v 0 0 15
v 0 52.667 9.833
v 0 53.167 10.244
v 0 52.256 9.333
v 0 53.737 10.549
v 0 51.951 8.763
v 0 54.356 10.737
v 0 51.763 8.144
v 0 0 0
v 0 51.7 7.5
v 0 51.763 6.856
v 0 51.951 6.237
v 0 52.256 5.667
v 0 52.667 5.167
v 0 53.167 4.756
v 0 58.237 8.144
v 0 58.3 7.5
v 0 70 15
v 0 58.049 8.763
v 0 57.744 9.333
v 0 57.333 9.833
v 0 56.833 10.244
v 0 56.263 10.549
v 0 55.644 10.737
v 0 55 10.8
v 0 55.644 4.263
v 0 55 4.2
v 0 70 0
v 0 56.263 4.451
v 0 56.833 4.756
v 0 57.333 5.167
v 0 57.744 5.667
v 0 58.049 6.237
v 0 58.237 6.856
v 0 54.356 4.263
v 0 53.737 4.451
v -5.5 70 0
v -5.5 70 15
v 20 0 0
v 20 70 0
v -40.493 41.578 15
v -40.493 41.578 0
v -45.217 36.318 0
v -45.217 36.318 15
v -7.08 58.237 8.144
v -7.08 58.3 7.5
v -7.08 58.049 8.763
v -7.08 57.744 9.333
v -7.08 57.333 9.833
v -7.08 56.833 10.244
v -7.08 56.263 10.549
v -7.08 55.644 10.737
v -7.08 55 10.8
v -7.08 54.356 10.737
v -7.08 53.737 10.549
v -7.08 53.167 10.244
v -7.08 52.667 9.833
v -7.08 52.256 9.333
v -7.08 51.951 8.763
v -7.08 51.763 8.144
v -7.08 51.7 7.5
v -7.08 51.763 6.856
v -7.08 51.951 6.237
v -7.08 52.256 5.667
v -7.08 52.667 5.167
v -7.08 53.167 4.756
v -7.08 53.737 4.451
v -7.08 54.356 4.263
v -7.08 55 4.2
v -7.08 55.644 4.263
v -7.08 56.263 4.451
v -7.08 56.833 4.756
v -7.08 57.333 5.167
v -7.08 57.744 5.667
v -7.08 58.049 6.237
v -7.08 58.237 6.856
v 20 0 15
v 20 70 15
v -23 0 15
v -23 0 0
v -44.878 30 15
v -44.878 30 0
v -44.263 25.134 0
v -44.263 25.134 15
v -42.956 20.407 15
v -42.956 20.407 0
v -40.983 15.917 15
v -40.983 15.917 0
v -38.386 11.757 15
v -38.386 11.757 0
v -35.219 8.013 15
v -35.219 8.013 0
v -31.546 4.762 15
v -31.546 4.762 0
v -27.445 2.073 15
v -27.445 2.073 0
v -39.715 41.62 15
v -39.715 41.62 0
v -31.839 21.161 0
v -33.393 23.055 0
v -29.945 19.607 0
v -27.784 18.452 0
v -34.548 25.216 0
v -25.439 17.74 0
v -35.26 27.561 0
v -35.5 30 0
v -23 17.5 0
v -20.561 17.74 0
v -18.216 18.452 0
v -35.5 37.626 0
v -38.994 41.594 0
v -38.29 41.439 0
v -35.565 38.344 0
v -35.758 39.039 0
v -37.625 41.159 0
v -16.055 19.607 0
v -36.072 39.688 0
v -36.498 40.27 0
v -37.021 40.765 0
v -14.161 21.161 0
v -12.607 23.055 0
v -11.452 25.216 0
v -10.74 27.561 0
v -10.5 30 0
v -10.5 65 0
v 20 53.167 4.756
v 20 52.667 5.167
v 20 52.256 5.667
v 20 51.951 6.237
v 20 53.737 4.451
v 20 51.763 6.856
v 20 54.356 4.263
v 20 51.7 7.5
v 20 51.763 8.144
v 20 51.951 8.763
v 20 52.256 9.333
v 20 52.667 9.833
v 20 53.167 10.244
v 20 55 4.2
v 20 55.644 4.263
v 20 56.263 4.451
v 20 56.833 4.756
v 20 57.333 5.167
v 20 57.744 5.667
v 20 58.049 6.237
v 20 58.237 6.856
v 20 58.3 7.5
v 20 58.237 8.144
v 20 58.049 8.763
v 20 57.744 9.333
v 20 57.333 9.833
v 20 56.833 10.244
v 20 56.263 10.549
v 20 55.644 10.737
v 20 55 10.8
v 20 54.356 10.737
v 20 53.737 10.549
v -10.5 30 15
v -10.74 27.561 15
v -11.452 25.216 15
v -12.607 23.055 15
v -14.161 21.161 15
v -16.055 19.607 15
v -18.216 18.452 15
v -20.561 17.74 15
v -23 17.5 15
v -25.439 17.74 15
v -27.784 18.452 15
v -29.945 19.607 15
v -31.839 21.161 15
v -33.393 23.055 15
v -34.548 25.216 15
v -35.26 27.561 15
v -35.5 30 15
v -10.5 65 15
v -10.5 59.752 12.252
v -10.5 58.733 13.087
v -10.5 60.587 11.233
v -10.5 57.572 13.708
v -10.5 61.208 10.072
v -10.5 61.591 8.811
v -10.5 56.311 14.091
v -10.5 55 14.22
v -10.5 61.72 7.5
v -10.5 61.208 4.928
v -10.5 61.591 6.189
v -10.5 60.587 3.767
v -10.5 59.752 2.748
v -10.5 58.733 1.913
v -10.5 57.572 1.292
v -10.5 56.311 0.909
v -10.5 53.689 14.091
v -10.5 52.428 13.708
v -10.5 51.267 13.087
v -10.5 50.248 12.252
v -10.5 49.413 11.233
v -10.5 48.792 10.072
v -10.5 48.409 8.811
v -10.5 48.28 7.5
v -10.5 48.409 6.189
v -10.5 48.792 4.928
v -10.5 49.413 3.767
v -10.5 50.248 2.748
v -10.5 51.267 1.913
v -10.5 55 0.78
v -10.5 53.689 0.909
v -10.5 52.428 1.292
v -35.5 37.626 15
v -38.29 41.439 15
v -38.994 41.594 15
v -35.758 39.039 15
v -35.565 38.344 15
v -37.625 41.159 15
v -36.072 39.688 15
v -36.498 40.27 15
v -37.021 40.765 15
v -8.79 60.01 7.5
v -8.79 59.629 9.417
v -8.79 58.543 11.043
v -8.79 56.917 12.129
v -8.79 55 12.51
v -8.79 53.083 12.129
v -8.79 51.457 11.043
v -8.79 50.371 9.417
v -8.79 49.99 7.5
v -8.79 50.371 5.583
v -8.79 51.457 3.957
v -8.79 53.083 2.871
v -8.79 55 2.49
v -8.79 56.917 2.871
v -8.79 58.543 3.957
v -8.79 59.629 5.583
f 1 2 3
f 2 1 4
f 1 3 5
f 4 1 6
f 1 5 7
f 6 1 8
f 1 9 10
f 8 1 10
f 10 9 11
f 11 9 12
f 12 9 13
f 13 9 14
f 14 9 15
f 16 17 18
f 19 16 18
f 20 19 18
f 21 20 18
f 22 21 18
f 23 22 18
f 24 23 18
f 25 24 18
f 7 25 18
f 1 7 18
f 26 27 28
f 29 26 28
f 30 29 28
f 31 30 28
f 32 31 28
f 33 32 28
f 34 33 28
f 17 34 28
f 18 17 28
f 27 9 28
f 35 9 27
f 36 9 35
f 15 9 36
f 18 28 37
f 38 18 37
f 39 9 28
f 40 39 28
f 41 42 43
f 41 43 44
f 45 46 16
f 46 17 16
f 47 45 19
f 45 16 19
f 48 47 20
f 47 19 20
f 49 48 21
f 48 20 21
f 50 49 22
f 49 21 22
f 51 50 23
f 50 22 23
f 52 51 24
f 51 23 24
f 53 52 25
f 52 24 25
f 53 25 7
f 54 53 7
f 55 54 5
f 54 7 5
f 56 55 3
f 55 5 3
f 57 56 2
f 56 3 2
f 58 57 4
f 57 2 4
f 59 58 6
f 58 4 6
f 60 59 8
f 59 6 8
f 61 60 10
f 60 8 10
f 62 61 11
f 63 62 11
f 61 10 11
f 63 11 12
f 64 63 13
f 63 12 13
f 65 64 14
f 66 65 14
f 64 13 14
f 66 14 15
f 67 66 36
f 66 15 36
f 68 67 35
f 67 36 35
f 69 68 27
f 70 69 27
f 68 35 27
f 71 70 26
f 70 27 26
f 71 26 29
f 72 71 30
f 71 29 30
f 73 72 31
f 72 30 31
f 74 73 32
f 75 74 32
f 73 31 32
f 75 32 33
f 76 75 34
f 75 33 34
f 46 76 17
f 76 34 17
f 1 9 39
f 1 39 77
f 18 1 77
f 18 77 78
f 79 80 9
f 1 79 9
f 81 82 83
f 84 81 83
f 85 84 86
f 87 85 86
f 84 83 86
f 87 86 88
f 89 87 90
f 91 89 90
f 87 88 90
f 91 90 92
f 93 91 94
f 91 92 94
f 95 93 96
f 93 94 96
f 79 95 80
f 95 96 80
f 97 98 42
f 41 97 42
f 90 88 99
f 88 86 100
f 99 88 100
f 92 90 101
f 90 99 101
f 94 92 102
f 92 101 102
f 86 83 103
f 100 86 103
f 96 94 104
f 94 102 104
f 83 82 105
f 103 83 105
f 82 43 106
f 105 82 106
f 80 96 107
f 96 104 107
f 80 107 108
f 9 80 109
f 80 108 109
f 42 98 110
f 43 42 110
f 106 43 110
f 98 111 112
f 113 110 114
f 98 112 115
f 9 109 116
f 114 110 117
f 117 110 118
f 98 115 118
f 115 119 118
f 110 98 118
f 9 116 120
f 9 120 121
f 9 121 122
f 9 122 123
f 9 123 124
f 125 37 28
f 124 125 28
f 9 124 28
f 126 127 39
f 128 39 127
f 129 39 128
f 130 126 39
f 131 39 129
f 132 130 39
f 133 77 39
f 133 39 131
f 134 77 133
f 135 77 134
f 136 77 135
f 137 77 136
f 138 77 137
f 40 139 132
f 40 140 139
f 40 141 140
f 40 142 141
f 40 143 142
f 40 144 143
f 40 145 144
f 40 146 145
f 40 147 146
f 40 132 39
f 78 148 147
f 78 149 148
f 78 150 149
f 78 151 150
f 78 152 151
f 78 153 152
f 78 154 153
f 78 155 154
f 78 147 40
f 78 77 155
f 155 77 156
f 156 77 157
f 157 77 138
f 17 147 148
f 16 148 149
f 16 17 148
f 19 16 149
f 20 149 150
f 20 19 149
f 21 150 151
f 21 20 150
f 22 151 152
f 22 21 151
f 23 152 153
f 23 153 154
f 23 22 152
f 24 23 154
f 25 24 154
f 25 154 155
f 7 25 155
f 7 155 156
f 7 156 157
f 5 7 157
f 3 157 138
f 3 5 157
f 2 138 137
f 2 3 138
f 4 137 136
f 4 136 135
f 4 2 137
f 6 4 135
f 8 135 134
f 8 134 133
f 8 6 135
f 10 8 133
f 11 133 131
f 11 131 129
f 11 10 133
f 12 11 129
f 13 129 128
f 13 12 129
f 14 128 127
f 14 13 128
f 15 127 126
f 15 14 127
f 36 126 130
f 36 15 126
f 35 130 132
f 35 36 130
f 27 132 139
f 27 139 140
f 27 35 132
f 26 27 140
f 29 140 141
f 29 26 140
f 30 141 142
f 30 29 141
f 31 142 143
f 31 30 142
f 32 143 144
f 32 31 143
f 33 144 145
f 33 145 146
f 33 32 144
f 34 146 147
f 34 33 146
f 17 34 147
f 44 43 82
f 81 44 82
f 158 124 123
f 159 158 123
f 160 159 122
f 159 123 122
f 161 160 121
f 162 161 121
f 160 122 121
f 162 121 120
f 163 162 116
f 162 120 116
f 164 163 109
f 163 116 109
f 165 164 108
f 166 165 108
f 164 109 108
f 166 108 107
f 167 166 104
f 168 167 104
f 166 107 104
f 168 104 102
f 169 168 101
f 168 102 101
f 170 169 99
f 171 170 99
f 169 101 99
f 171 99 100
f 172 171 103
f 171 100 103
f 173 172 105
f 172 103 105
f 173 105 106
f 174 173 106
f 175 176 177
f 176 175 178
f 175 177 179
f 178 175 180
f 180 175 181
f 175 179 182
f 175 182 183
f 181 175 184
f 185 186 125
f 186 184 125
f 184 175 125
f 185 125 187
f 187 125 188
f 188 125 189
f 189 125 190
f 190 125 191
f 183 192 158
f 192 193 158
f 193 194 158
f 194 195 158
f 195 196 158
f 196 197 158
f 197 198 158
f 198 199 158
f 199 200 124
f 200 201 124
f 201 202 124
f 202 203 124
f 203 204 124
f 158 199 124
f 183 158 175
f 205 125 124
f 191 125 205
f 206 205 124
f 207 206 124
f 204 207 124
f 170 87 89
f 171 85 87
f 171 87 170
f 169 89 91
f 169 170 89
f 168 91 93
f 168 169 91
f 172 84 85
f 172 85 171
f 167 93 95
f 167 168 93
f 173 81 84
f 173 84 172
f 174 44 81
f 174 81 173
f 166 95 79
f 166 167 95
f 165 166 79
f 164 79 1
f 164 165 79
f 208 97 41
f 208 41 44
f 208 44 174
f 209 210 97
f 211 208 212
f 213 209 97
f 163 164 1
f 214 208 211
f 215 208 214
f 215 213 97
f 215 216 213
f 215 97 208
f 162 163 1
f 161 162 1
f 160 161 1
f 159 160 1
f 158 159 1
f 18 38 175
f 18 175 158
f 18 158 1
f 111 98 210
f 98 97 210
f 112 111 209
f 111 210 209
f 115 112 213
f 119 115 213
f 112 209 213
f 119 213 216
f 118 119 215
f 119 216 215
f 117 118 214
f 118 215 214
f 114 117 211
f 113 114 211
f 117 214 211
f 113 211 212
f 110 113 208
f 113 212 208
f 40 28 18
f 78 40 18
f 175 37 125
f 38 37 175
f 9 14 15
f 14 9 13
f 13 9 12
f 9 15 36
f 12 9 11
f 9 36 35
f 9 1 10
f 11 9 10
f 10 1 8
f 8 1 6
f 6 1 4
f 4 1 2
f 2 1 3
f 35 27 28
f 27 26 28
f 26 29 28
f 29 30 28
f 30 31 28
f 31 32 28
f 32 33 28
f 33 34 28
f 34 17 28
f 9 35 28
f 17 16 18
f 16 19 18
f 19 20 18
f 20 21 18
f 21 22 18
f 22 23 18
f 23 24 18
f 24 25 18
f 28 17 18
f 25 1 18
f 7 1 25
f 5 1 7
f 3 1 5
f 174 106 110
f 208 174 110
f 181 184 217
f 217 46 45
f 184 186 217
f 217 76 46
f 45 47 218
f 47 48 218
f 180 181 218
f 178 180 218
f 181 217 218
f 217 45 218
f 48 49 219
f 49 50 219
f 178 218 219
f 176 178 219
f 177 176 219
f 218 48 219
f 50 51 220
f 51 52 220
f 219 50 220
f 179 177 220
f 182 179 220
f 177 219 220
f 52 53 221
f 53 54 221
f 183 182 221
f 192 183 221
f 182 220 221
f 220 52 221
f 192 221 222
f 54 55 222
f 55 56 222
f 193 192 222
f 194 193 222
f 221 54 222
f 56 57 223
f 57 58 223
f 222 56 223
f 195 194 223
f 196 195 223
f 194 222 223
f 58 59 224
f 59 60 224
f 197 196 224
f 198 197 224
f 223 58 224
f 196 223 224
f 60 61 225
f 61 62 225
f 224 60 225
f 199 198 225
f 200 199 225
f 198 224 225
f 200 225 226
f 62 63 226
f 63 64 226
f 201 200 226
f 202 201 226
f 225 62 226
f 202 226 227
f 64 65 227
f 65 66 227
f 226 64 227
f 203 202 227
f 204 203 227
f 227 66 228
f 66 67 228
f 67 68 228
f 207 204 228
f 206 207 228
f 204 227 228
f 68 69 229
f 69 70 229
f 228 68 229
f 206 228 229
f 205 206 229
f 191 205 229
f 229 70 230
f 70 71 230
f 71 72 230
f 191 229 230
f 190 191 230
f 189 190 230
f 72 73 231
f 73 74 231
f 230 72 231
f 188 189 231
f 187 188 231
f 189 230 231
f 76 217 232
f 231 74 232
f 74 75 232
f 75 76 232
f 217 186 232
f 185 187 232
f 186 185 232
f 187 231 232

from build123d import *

# Parameters (mm, degrees)
F1_DEPTH       = 15
F3_D           = 6.6
F3_CSINK_D     = 13.44
F3_CSINK_ANGLE = 90
F4_SIZE        = 5
F5_SIZE        = 5
F6_R           = 4
F7_W           = 70
F7_H           = 15
F7_R           = 3.3
F8_DEPTH       = 20


with BuildPart() as f1:
    # F0 (on Top) → F1 (new body)
    with BuildSketch(Plane.XY):
        with BuildLine():
            Line((-23, 0), (0, 0))
            Line((0, 0), (0, 70))
            Line((0, 70), (-10.5, 70))
            Line((-10.5, 70), (-10.5, 30))
            ThreePointArc((-10.5, 30), (-23, 17.5), (-35.5, 30))
            Line((-35.5, 30), (-35.5, 41.8466433071))
            Line((-35.5, 41.8466433071), (-45.4856073802, 41.3103176141))
            Line((-45.4856073802, 41.3103176141), (-44.8781316702, 30))
            ThreePointArc((-44.8781316702, 30), (-38.3862259538, 11.7568148455), (-23, 0))
        make_face()
    extrude(amount=F1_DEPTH)

    # F3 (through all)
    with Locations(Plane(origin=(-10.5, 0, 0), x_dir=(0, -1, 0), z_dir=(-1, 0, 0))):
        with Locations((-55, 7.5)):
            CounterSinkHole(F3_D / 2, F3_CSINK_D / 2, counter_sink_angle=F3_CSINK_ANGLE)

    # F4
    f4_edges = [f1.edges().sort_by_distance(p)[0] for p in [
        (-10.5, 70, 7.5),
    ]]
    chamfer(f4_edges, length=F4_SIZE)

    # F5
    f5_edges = [f1.edges().sort_by_distance(p)[0] for p in [
        (-45.485607, 41.310318, 7.5),
    ]]
    chamfer(f5_edges, length=F5_SIZE)

    # F6
    f6_edges = [f1.edges().sort_by_distance(p)[0] for p in [
        (-35.5, 41.846643, 7.5),
    ]]
    fillet(f6_edges, radius=F6_R)


with BuildPart() as f8:
    # F7 (on face) → F8 (new body)
    with BuildSketch(Plane.YZ):
        with Locations((35, 7.5)):
            Rectangle(F7_W, F7_H)
        with Locations((55, 7.5)):
            Circle(F7_R, mode=Mode.SUBTRACT)
    extrude(amount=F8_DEPTH)


solid = Compound([f1.part, f8.part])
